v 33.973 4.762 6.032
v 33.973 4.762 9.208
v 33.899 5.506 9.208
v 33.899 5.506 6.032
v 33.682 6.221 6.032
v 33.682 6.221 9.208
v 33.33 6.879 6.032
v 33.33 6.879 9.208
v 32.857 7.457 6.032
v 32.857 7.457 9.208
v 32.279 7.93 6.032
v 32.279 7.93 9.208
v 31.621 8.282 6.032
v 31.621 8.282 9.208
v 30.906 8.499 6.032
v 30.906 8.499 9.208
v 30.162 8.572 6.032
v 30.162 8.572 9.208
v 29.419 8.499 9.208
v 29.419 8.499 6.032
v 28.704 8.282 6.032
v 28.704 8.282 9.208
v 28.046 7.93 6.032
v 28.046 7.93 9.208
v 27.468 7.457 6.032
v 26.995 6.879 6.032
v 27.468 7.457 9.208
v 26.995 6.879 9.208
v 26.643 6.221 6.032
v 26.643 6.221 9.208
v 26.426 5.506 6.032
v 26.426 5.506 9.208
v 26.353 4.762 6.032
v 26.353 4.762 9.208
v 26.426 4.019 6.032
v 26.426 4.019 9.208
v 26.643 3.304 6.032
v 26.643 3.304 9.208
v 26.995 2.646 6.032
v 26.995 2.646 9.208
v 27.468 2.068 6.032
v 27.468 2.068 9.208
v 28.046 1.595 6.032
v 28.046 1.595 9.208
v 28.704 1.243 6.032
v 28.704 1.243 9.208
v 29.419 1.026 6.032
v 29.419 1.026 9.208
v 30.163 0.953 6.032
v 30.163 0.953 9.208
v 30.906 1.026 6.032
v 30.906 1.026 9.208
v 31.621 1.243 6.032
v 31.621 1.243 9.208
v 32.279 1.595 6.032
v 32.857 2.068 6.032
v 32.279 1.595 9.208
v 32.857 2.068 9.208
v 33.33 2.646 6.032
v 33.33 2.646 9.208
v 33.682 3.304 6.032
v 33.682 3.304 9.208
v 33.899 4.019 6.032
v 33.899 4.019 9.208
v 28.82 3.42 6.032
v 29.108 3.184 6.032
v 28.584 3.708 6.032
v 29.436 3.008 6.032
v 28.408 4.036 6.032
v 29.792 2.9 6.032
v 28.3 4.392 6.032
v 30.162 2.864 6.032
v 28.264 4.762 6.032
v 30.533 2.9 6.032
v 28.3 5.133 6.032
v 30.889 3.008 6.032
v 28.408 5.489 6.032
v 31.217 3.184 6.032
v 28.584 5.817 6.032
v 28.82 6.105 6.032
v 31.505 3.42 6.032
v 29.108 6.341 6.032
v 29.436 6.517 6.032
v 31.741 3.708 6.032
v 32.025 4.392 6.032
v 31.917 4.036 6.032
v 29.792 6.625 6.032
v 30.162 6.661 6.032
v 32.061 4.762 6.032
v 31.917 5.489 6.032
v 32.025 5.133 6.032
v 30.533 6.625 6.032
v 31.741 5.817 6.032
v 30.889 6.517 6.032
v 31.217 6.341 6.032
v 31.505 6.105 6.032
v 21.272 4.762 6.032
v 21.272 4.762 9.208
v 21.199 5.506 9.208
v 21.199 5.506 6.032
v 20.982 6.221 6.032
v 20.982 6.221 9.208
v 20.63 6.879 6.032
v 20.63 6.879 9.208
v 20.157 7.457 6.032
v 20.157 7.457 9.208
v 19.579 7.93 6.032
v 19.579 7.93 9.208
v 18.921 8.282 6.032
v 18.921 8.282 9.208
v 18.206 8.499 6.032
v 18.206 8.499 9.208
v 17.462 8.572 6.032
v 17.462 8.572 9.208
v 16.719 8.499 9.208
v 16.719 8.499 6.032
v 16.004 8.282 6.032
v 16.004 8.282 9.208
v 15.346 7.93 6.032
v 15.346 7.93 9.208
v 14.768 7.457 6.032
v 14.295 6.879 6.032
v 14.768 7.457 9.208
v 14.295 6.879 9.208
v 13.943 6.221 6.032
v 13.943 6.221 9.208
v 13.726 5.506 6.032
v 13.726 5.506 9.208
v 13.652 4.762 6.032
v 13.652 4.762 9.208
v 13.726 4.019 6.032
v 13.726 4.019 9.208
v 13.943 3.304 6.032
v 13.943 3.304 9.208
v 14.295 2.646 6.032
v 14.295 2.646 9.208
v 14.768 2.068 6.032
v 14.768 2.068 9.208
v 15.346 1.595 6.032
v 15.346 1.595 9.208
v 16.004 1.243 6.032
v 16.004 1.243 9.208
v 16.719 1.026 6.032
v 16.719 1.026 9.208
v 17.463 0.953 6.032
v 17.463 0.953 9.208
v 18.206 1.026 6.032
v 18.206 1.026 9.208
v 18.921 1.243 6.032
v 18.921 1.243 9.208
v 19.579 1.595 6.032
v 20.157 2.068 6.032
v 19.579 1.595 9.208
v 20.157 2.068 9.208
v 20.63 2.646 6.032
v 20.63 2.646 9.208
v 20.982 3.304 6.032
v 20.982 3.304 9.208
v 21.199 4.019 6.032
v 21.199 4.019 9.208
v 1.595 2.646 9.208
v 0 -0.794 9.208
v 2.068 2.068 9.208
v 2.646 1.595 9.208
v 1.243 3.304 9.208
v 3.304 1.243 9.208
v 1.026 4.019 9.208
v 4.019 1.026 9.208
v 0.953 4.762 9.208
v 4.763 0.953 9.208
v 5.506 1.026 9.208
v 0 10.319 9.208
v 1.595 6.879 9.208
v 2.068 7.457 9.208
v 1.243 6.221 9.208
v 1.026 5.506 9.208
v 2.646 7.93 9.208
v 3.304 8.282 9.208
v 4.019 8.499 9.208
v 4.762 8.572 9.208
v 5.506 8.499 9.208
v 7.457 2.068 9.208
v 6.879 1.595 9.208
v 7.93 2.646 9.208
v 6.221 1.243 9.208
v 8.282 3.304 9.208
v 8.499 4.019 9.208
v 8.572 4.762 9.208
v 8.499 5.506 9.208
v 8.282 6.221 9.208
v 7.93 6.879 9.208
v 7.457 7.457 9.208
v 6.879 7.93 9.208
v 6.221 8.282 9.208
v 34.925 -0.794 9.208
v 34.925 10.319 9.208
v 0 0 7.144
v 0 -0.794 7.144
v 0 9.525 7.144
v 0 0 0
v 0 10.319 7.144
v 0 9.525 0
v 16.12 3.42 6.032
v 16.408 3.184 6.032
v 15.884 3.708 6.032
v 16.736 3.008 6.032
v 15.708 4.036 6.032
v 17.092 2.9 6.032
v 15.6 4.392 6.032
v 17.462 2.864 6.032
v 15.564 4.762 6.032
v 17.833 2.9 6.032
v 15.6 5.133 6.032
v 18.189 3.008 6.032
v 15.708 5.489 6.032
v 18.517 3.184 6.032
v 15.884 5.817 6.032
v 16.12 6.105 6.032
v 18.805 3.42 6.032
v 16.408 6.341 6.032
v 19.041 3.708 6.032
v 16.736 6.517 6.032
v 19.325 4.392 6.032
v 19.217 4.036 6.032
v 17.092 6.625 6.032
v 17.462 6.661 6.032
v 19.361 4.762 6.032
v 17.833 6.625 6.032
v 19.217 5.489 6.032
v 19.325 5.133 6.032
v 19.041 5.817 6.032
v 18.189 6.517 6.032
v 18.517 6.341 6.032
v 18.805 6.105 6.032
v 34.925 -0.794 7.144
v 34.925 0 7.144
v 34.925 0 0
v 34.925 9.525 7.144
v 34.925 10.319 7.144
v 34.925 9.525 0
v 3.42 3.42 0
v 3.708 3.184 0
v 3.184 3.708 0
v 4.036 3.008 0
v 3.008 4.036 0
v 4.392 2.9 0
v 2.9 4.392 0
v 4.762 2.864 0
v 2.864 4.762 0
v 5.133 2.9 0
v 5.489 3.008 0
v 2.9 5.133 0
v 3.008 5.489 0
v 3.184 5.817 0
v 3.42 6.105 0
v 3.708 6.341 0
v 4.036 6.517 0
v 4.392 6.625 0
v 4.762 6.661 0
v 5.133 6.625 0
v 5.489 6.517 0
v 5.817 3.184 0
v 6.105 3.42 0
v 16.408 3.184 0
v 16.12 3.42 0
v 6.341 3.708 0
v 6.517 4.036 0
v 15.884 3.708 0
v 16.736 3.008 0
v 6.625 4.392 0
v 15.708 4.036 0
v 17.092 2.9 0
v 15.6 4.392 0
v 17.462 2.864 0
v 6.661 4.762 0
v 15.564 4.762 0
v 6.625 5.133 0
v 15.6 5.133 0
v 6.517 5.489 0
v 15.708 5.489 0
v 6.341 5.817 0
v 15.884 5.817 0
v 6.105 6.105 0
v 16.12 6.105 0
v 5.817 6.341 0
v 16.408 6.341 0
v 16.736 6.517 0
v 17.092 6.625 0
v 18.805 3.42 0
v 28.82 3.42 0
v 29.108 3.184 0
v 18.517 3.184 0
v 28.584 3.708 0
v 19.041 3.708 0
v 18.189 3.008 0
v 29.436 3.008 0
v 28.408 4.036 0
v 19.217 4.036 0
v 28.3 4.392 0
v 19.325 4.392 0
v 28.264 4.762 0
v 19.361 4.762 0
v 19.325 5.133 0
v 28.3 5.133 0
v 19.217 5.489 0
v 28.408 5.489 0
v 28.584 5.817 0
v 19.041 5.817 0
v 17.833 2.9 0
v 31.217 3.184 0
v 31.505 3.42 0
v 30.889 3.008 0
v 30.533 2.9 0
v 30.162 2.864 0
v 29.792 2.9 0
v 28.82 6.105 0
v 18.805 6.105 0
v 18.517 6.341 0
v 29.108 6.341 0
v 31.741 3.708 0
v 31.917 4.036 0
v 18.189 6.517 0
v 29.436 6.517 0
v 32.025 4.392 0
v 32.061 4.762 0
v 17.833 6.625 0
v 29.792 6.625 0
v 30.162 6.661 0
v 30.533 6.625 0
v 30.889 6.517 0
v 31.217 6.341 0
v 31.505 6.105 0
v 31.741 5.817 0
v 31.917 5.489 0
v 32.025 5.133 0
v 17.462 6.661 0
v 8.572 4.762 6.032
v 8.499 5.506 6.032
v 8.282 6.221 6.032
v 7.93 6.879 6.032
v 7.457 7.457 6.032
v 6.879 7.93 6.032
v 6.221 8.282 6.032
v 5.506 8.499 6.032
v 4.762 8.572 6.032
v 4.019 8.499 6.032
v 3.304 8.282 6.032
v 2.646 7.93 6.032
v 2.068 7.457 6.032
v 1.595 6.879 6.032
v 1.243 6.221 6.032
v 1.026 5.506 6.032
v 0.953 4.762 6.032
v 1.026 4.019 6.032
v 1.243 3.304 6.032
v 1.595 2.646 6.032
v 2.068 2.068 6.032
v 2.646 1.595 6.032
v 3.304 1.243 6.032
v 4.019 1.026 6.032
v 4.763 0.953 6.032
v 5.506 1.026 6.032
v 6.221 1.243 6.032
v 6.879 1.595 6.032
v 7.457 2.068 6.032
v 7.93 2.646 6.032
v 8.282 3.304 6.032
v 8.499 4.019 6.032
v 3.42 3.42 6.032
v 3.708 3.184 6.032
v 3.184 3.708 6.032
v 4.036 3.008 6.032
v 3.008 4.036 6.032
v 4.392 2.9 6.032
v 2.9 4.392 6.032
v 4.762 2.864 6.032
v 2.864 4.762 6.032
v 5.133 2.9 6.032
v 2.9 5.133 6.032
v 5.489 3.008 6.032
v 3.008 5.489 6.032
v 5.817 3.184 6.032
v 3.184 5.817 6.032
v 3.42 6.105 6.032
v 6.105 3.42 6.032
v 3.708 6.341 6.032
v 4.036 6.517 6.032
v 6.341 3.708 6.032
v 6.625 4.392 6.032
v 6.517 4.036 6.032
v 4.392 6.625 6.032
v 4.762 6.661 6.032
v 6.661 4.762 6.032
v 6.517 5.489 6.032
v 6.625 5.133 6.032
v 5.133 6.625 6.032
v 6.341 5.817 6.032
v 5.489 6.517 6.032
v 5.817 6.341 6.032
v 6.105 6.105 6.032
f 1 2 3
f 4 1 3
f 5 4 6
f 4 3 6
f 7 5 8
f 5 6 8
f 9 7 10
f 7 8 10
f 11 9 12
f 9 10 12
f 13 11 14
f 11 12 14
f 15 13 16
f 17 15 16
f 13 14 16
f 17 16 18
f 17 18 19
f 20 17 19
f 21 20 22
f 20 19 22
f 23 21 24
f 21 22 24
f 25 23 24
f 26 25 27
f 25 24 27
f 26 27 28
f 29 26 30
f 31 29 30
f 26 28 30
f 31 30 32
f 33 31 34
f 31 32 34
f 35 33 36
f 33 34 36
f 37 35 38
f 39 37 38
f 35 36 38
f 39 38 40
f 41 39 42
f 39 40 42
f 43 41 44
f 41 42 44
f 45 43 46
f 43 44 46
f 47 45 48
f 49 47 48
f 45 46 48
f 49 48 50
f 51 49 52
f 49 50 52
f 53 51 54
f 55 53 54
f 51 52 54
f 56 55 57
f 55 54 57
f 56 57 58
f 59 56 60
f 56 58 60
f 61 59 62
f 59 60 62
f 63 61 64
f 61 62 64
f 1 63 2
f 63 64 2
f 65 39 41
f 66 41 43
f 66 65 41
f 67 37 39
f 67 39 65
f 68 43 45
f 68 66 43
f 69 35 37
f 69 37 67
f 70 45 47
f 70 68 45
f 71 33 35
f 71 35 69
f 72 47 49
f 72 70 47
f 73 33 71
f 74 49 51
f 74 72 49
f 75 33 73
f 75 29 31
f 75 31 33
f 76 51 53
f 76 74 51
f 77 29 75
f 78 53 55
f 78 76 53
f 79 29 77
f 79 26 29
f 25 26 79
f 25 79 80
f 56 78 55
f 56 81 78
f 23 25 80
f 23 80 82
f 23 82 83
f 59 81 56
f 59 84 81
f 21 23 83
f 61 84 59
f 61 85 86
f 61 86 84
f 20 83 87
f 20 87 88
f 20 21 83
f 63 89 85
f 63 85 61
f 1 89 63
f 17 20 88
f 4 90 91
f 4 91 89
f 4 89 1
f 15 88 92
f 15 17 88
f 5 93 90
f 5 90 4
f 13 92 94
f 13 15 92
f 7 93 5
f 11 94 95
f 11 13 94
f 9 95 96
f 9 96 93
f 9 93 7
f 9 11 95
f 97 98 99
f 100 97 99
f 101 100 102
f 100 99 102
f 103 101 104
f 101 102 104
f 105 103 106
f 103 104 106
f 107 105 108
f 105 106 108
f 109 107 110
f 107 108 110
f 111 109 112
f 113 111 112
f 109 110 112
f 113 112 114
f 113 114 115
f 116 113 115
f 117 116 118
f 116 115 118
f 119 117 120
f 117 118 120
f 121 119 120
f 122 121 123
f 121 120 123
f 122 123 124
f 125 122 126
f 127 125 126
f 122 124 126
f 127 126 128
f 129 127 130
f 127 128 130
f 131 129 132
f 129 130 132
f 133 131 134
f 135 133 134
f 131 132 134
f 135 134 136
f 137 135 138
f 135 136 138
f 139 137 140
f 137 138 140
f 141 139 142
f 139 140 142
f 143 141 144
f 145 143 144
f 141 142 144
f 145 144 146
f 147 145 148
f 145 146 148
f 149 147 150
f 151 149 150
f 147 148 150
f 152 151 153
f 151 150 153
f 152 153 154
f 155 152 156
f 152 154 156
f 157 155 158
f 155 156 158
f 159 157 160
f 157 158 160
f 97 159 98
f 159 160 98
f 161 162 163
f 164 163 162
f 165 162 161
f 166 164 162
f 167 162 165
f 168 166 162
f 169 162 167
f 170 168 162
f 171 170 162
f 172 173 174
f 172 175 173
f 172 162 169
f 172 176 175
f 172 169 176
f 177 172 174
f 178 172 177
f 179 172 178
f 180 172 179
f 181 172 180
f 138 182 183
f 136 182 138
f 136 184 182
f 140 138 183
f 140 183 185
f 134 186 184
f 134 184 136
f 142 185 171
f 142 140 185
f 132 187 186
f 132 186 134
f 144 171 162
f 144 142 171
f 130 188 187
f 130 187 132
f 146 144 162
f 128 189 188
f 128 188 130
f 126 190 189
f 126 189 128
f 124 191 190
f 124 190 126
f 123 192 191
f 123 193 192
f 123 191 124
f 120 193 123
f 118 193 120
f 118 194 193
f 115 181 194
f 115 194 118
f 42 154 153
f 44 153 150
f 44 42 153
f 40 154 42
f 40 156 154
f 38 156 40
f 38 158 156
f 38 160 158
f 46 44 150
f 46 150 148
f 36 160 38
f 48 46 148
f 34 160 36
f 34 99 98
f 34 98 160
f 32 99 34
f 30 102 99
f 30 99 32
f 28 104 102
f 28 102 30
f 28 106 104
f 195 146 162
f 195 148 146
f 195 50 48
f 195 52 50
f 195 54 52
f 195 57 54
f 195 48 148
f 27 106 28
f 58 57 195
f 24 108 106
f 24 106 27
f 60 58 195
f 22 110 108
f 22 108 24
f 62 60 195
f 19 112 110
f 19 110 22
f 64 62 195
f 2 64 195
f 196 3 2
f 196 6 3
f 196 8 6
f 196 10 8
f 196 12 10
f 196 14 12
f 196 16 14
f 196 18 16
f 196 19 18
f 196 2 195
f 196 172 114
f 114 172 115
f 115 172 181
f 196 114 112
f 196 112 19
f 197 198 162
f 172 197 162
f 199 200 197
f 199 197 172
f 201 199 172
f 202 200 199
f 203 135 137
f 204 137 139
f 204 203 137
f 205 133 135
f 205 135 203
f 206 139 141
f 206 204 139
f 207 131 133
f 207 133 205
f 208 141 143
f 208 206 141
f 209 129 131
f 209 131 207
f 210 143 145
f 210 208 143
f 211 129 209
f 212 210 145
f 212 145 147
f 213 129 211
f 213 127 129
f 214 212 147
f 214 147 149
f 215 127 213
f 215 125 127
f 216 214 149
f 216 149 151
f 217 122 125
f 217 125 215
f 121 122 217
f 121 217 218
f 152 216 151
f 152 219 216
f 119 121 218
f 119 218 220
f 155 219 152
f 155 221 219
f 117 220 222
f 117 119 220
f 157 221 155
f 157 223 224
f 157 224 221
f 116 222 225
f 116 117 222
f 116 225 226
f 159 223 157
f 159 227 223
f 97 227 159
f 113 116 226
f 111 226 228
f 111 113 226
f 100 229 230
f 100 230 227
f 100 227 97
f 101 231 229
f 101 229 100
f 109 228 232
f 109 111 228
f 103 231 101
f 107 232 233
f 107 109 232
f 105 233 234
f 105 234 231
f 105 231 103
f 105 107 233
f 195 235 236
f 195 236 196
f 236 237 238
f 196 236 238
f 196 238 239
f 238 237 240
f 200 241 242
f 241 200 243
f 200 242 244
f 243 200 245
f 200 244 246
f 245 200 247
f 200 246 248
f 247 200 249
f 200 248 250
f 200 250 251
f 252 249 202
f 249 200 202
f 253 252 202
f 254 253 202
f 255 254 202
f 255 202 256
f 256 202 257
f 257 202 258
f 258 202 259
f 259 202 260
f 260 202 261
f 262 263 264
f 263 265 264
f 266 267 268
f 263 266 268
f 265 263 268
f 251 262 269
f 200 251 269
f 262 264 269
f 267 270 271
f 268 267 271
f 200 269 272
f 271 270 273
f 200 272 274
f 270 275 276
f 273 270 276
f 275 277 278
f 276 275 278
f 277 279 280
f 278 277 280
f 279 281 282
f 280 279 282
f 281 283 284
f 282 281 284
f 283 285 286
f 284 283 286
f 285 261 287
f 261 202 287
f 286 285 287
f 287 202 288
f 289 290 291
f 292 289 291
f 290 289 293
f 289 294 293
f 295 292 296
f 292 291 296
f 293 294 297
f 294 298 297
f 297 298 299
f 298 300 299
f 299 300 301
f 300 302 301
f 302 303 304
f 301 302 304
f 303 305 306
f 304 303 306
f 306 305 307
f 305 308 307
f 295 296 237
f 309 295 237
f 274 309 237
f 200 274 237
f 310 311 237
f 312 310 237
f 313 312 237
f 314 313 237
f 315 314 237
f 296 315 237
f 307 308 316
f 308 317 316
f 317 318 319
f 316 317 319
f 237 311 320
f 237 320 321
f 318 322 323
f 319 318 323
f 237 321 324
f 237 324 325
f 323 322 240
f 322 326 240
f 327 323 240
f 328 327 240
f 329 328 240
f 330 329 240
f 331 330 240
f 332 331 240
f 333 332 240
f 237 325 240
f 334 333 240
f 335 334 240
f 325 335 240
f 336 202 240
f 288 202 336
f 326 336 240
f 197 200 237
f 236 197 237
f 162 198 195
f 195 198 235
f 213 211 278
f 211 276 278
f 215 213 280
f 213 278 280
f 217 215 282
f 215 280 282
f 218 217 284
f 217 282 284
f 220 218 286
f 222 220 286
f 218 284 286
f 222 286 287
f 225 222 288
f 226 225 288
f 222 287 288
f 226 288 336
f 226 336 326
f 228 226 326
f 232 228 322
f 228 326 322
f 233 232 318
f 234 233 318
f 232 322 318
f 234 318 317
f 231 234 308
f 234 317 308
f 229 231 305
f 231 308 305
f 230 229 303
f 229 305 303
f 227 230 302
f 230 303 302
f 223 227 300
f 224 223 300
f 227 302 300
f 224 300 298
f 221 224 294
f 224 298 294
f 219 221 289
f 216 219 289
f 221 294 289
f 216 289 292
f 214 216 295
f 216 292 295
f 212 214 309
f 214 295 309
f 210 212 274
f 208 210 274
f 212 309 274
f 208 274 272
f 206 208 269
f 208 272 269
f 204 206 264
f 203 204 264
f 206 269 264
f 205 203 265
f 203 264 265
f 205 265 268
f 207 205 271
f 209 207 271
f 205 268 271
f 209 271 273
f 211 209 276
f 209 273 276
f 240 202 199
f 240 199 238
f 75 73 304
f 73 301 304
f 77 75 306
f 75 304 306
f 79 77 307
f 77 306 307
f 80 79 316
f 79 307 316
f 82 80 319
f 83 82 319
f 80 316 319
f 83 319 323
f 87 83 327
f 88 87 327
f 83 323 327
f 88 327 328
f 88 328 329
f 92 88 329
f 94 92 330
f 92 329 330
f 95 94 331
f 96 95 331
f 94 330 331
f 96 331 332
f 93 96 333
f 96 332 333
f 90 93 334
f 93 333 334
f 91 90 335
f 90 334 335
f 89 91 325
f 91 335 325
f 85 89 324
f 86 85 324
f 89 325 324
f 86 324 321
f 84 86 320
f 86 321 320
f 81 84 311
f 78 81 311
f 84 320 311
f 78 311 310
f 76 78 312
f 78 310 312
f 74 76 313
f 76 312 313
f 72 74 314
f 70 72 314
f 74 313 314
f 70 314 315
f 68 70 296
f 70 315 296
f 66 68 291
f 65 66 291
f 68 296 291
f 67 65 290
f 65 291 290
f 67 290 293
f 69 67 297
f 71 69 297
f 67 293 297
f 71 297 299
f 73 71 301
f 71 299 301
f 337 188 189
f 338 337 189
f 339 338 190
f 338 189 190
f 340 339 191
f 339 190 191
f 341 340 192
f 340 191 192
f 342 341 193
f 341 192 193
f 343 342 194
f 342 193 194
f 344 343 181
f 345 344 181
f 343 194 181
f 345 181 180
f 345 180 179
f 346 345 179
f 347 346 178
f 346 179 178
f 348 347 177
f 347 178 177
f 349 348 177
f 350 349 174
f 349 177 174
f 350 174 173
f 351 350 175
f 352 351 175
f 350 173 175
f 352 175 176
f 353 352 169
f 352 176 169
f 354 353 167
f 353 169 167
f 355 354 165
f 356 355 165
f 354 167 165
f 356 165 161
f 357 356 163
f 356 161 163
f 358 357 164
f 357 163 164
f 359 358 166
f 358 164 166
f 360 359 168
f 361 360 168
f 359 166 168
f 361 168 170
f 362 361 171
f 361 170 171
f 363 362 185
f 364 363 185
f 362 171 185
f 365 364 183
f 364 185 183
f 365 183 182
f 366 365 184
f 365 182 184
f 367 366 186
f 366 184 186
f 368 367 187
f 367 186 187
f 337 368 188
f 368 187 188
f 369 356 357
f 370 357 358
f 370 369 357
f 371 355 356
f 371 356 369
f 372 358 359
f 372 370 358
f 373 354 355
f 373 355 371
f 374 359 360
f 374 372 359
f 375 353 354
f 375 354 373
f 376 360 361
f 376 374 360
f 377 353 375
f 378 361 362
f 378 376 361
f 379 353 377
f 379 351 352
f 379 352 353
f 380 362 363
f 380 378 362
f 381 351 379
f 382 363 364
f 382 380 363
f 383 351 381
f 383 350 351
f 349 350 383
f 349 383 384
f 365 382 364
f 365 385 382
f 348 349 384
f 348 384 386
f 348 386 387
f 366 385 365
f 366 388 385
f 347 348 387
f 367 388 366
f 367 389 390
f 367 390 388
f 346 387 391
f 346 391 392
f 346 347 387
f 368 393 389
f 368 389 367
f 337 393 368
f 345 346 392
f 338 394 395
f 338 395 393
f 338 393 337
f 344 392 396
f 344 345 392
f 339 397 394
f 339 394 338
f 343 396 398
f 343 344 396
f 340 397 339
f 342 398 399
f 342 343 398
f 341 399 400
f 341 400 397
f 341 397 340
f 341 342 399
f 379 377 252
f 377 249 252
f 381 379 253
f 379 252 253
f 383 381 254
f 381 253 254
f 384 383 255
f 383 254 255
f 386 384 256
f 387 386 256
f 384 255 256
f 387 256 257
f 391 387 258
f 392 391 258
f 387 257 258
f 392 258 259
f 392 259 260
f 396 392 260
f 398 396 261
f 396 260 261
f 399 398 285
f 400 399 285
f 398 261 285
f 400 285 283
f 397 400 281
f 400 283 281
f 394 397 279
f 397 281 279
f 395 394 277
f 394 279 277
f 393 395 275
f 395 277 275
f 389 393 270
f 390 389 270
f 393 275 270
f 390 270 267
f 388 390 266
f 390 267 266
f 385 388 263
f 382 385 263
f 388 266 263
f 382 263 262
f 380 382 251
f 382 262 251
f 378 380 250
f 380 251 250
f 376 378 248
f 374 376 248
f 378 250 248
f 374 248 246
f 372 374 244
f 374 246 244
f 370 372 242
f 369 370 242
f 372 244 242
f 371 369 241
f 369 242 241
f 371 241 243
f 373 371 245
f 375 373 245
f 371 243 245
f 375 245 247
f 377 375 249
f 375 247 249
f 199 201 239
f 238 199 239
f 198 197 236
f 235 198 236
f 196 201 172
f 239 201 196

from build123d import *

# Parameters (mm, degrees)
SKETCH1_W                 = 34.925
SKETCH1_H                 = 9.525
BOSS_EXTRUDE1_DEPTH       = 7.14375
SKETCH2_W                 = 34.925
SKETCH2_H                 = 11.1125
BOSS_EXTRUDE2_DEPTH       = 2.06375
F_6_CLEARANCE_HOLE1_D     = 3.7973
F_6_CLEARANCE_HOLE1_DEPTH = 9.2075
SKETCH5_R                 = 3.81
CUT_EXTRUDE1_DEPTH        = 3.175


with BuildPart() as part:
    # Sketch1 → Boss-Extrude1 (new body)
    with BuildSketch(Plane.XY):
        with Locations((17.4625, 4.7625)):
            Rectangle(SKETCH1_W, SKETCH1_H)
    extrude(amount=BOSS_EXTRUDE1_DEPTH)

    # Sketch2 → Boss-Extrude2 (add)
    with BuildSketch(Plane.XY.offset(7.14375)):
        with Locations((17.4625, 4.7625)):
            Rectangle(SKETCH2_W, SKETCH2_H)
    extrude(amount=BOSS_EXTRUDE2_DEPTH)

    # #6 Clearance Hole1
    with Locations(Plane.XY.offset(9.2075)):
        with Locations((4.7625, 4.7625), (17.4625, 4.7625), (30.1625, 4.7625)):
            Hole(F_6_CLEARANCE_HOLE1_D / 2, depth=F_6_CLEARANCE_HOLE1_DEPTH)

    # Sketch5 → Cut-Extrude1 (cut)
    with BuildSketch(Plane.XY.offset(9.2075)):
        with Locations((4.7625, 4.7625)):
            Circle(SKETCH5_R)
        with Locations((17.4625, 4.7625)):
            Circle(SKETCH5_R)
        with Locations((30.1625, 4.7625)):
            Circle(SKETCH5_R)
    extrude(amount=-CUT_EXTRUDE1_DEPTH, mode=Mode.SUBTRACT)


solid = part.part
